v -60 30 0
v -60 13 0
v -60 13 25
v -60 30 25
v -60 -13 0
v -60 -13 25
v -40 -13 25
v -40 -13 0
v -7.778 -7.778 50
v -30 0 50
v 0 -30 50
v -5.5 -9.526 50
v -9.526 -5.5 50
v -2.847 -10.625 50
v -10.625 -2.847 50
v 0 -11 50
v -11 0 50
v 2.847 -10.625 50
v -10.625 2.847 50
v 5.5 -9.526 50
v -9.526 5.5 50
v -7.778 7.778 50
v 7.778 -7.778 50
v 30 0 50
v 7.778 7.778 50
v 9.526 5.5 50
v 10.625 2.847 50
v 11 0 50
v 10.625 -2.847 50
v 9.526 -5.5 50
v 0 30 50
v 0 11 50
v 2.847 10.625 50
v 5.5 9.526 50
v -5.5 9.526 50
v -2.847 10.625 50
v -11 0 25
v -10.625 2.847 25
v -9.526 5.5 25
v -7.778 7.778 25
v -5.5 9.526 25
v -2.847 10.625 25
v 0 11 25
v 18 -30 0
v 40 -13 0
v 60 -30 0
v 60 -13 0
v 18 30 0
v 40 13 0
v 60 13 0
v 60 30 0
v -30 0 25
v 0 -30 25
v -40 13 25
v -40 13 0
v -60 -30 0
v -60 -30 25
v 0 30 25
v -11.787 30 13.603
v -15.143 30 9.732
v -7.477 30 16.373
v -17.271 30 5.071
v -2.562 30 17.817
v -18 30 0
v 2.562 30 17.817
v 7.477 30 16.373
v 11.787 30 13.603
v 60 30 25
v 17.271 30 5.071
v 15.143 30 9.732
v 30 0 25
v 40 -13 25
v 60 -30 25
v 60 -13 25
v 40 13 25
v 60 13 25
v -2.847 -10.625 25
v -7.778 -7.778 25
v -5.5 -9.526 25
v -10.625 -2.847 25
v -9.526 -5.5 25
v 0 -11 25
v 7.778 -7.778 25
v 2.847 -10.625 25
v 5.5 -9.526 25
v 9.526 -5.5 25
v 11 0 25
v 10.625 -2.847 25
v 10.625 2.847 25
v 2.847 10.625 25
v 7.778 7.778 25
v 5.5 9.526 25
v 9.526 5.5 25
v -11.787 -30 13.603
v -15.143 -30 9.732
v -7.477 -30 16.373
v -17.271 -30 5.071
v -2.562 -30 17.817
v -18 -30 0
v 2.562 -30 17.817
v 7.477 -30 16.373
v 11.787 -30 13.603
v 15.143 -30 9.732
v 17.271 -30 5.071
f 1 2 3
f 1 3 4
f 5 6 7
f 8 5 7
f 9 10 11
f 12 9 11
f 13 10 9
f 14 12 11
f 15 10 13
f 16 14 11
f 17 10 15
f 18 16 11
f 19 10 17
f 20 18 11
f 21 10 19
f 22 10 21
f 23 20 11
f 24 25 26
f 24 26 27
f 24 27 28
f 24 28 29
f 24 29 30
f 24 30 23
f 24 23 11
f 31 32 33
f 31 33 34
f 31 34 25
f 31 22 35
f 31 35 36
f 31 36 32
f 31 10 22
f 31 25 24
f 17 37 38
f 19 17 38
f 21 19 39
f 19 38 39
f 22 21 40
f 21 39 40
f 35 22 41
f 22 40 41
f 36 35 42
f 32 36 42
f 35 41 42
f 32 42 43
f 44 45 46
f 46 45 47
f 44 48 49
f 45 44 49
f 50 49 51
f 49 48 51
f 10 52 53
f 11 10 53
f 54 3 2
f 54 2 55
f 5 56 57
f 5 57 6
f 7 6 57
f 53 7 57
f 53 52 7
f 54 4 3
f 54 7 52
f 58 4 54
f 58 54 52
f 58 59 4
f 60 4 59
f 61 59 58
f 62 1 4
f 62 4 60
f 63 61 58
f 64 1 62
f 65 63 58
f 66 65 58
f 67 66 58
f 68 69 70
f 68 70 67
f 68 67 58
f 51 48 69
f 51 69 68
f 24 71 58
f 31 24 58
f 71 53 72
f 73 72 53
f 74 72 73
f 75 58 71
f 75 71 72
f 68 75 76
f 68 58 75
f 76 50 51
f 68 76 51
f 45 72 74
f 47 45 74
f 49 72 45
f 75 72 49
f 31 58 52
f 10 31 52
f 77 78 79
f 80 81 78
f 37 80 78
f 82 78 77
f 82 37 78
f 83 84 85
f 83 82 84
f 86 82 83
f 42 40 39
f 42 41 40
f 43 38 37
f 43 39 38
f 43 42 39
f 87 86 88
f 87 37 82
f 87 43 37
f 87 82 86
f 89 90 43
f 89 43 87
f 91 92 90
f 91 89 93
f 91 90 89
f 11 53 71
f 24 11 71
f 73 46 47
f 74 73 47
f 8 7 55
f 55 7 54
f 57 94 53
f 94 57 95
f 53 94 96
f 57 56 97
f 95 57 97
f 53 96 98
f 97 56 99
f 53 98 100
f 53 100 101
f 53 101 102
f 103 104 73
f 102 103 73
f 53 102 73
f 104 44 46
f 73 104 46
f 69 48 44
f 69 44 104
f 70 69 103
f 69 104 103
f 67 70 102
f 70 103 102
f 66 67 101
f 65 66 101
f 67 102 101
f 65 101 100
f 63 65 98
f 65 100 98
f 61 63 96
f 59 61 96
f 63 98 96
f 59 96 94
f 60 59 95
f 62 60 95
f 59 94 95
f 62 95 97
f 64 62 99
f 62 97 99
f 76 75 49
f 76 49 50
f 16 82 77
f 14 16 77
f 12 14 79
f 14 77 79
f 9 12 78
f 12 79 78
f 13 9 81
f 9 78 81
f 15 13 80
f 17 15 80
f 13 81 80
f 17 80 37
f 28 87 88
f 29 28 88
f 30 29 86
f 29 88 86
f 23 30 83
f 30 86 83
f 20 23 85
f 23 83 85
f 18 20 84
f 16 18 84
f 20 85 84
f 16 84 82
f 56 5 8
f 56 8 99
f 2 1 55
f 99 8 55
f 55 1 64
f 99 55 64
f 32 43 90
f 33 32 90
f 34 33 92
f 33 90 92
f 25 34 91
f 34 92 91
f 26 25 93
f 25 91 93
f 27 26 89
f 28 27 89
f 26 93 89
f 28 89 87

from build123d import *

# Parameters (mm, degrees)
F0_W      = 120
F0_H      = 60
F1_DEPTH  = 25
F2_W      = 20
F2_H      = 26
F3_DEPTH  = 25.001
F4_W      = 20
F4_H      = 26
F5_DEPTH  = 25.001
F7_DEPTH  = 25
F8_DEPTH  = 35.001
F10_DEPTH = 25


with BuildPart() as f1:
    # F0 (on Top) → F1 (new body)
    with BuildSketch(Plane.XY):
        Rectangle(F0_W, F0_H)
    extrude(amount=F1_DEPTH)

    # F2 (on face) → F3 (cut, through all)
    with BuildSketch(Plane.XY.offset(25)):
        with Locations((50, 0)):
            Rectangle(F2_W, F2_H)
    extrude(amount=-F3_DEPTH, mode=Mode.SUBTRACT)

    # F4 (on face) → F5 (cut, through all)
    with BuildSketch(Plane.XY.offset(25)):
        with Locations((-50, 0)):
            Rectangle(F4_W, F4_H)
    extrude(amount=-F5_DEPTH, mode=Mode.SUBTRACT)

    # F6 (on face) → F7 (cut)
    with BuildSketch(Plane.XZ.offset(30)):
        with BuildLine():
            Line((-18, 0), (18, 0))
            ThreePointArc((18, 0), (0, 18), (-18, 0))
        make_face()
    extrude(amount=-F7_DEPTH, mode=Mode.SUBTRACT)

    # F8 (cut, through all): a face of the model
    f8_faces = [f1.faces().sort_by_distance(p)[0] for p in [
        (0, -5, 7.6394372684),
    ]]
    extrude(f8_faces, amount=-F8_DEPTH, mode=Mode.SUBTRACT)

    # F9 (on face) → F10 (join)
    with BuildSketch(Plane.XY.offset(25)):
        with BuildLine():
            ThreePointArc((0, 11), (7.7781745931, 7.7781745931), (11, 0))
            Line((11, 0), (30, 0))
            Line((30, 0), (0, 30))
            Line((0, 30), (0, 11))
        make_face()
        with BuildLine():
            ThreePointArc((-11, 0), (-7.7781745931, 7.7781745931), (0, 11))
            Line((0, 11), (0, 30))
            Line((0, 30), (-30, 0))
            Line((-30, 0), (-11, 0))
        make_face()
        with BuildLine():
            Line((0, -30), (0, -11))
            ThreePointArc((0, -11), (-7.7781745931, -7.7781745931), (-11, 0))
            Line((-11, 0), (-30, 0))
            Line((-30, 0), (0, -30))
        make_face()
        with BuildLine():
            Line((30, 0), (11, 0))
            ThreePointArc((11, 0), (7.7781745931, -7.7781745931), (0, -11))
            Line((0, -11), (0, -30))
            Line((0, -30), (30, 0))
        make_face()
    extrude(amount=F10_DEPTH)


solid = f1.part
